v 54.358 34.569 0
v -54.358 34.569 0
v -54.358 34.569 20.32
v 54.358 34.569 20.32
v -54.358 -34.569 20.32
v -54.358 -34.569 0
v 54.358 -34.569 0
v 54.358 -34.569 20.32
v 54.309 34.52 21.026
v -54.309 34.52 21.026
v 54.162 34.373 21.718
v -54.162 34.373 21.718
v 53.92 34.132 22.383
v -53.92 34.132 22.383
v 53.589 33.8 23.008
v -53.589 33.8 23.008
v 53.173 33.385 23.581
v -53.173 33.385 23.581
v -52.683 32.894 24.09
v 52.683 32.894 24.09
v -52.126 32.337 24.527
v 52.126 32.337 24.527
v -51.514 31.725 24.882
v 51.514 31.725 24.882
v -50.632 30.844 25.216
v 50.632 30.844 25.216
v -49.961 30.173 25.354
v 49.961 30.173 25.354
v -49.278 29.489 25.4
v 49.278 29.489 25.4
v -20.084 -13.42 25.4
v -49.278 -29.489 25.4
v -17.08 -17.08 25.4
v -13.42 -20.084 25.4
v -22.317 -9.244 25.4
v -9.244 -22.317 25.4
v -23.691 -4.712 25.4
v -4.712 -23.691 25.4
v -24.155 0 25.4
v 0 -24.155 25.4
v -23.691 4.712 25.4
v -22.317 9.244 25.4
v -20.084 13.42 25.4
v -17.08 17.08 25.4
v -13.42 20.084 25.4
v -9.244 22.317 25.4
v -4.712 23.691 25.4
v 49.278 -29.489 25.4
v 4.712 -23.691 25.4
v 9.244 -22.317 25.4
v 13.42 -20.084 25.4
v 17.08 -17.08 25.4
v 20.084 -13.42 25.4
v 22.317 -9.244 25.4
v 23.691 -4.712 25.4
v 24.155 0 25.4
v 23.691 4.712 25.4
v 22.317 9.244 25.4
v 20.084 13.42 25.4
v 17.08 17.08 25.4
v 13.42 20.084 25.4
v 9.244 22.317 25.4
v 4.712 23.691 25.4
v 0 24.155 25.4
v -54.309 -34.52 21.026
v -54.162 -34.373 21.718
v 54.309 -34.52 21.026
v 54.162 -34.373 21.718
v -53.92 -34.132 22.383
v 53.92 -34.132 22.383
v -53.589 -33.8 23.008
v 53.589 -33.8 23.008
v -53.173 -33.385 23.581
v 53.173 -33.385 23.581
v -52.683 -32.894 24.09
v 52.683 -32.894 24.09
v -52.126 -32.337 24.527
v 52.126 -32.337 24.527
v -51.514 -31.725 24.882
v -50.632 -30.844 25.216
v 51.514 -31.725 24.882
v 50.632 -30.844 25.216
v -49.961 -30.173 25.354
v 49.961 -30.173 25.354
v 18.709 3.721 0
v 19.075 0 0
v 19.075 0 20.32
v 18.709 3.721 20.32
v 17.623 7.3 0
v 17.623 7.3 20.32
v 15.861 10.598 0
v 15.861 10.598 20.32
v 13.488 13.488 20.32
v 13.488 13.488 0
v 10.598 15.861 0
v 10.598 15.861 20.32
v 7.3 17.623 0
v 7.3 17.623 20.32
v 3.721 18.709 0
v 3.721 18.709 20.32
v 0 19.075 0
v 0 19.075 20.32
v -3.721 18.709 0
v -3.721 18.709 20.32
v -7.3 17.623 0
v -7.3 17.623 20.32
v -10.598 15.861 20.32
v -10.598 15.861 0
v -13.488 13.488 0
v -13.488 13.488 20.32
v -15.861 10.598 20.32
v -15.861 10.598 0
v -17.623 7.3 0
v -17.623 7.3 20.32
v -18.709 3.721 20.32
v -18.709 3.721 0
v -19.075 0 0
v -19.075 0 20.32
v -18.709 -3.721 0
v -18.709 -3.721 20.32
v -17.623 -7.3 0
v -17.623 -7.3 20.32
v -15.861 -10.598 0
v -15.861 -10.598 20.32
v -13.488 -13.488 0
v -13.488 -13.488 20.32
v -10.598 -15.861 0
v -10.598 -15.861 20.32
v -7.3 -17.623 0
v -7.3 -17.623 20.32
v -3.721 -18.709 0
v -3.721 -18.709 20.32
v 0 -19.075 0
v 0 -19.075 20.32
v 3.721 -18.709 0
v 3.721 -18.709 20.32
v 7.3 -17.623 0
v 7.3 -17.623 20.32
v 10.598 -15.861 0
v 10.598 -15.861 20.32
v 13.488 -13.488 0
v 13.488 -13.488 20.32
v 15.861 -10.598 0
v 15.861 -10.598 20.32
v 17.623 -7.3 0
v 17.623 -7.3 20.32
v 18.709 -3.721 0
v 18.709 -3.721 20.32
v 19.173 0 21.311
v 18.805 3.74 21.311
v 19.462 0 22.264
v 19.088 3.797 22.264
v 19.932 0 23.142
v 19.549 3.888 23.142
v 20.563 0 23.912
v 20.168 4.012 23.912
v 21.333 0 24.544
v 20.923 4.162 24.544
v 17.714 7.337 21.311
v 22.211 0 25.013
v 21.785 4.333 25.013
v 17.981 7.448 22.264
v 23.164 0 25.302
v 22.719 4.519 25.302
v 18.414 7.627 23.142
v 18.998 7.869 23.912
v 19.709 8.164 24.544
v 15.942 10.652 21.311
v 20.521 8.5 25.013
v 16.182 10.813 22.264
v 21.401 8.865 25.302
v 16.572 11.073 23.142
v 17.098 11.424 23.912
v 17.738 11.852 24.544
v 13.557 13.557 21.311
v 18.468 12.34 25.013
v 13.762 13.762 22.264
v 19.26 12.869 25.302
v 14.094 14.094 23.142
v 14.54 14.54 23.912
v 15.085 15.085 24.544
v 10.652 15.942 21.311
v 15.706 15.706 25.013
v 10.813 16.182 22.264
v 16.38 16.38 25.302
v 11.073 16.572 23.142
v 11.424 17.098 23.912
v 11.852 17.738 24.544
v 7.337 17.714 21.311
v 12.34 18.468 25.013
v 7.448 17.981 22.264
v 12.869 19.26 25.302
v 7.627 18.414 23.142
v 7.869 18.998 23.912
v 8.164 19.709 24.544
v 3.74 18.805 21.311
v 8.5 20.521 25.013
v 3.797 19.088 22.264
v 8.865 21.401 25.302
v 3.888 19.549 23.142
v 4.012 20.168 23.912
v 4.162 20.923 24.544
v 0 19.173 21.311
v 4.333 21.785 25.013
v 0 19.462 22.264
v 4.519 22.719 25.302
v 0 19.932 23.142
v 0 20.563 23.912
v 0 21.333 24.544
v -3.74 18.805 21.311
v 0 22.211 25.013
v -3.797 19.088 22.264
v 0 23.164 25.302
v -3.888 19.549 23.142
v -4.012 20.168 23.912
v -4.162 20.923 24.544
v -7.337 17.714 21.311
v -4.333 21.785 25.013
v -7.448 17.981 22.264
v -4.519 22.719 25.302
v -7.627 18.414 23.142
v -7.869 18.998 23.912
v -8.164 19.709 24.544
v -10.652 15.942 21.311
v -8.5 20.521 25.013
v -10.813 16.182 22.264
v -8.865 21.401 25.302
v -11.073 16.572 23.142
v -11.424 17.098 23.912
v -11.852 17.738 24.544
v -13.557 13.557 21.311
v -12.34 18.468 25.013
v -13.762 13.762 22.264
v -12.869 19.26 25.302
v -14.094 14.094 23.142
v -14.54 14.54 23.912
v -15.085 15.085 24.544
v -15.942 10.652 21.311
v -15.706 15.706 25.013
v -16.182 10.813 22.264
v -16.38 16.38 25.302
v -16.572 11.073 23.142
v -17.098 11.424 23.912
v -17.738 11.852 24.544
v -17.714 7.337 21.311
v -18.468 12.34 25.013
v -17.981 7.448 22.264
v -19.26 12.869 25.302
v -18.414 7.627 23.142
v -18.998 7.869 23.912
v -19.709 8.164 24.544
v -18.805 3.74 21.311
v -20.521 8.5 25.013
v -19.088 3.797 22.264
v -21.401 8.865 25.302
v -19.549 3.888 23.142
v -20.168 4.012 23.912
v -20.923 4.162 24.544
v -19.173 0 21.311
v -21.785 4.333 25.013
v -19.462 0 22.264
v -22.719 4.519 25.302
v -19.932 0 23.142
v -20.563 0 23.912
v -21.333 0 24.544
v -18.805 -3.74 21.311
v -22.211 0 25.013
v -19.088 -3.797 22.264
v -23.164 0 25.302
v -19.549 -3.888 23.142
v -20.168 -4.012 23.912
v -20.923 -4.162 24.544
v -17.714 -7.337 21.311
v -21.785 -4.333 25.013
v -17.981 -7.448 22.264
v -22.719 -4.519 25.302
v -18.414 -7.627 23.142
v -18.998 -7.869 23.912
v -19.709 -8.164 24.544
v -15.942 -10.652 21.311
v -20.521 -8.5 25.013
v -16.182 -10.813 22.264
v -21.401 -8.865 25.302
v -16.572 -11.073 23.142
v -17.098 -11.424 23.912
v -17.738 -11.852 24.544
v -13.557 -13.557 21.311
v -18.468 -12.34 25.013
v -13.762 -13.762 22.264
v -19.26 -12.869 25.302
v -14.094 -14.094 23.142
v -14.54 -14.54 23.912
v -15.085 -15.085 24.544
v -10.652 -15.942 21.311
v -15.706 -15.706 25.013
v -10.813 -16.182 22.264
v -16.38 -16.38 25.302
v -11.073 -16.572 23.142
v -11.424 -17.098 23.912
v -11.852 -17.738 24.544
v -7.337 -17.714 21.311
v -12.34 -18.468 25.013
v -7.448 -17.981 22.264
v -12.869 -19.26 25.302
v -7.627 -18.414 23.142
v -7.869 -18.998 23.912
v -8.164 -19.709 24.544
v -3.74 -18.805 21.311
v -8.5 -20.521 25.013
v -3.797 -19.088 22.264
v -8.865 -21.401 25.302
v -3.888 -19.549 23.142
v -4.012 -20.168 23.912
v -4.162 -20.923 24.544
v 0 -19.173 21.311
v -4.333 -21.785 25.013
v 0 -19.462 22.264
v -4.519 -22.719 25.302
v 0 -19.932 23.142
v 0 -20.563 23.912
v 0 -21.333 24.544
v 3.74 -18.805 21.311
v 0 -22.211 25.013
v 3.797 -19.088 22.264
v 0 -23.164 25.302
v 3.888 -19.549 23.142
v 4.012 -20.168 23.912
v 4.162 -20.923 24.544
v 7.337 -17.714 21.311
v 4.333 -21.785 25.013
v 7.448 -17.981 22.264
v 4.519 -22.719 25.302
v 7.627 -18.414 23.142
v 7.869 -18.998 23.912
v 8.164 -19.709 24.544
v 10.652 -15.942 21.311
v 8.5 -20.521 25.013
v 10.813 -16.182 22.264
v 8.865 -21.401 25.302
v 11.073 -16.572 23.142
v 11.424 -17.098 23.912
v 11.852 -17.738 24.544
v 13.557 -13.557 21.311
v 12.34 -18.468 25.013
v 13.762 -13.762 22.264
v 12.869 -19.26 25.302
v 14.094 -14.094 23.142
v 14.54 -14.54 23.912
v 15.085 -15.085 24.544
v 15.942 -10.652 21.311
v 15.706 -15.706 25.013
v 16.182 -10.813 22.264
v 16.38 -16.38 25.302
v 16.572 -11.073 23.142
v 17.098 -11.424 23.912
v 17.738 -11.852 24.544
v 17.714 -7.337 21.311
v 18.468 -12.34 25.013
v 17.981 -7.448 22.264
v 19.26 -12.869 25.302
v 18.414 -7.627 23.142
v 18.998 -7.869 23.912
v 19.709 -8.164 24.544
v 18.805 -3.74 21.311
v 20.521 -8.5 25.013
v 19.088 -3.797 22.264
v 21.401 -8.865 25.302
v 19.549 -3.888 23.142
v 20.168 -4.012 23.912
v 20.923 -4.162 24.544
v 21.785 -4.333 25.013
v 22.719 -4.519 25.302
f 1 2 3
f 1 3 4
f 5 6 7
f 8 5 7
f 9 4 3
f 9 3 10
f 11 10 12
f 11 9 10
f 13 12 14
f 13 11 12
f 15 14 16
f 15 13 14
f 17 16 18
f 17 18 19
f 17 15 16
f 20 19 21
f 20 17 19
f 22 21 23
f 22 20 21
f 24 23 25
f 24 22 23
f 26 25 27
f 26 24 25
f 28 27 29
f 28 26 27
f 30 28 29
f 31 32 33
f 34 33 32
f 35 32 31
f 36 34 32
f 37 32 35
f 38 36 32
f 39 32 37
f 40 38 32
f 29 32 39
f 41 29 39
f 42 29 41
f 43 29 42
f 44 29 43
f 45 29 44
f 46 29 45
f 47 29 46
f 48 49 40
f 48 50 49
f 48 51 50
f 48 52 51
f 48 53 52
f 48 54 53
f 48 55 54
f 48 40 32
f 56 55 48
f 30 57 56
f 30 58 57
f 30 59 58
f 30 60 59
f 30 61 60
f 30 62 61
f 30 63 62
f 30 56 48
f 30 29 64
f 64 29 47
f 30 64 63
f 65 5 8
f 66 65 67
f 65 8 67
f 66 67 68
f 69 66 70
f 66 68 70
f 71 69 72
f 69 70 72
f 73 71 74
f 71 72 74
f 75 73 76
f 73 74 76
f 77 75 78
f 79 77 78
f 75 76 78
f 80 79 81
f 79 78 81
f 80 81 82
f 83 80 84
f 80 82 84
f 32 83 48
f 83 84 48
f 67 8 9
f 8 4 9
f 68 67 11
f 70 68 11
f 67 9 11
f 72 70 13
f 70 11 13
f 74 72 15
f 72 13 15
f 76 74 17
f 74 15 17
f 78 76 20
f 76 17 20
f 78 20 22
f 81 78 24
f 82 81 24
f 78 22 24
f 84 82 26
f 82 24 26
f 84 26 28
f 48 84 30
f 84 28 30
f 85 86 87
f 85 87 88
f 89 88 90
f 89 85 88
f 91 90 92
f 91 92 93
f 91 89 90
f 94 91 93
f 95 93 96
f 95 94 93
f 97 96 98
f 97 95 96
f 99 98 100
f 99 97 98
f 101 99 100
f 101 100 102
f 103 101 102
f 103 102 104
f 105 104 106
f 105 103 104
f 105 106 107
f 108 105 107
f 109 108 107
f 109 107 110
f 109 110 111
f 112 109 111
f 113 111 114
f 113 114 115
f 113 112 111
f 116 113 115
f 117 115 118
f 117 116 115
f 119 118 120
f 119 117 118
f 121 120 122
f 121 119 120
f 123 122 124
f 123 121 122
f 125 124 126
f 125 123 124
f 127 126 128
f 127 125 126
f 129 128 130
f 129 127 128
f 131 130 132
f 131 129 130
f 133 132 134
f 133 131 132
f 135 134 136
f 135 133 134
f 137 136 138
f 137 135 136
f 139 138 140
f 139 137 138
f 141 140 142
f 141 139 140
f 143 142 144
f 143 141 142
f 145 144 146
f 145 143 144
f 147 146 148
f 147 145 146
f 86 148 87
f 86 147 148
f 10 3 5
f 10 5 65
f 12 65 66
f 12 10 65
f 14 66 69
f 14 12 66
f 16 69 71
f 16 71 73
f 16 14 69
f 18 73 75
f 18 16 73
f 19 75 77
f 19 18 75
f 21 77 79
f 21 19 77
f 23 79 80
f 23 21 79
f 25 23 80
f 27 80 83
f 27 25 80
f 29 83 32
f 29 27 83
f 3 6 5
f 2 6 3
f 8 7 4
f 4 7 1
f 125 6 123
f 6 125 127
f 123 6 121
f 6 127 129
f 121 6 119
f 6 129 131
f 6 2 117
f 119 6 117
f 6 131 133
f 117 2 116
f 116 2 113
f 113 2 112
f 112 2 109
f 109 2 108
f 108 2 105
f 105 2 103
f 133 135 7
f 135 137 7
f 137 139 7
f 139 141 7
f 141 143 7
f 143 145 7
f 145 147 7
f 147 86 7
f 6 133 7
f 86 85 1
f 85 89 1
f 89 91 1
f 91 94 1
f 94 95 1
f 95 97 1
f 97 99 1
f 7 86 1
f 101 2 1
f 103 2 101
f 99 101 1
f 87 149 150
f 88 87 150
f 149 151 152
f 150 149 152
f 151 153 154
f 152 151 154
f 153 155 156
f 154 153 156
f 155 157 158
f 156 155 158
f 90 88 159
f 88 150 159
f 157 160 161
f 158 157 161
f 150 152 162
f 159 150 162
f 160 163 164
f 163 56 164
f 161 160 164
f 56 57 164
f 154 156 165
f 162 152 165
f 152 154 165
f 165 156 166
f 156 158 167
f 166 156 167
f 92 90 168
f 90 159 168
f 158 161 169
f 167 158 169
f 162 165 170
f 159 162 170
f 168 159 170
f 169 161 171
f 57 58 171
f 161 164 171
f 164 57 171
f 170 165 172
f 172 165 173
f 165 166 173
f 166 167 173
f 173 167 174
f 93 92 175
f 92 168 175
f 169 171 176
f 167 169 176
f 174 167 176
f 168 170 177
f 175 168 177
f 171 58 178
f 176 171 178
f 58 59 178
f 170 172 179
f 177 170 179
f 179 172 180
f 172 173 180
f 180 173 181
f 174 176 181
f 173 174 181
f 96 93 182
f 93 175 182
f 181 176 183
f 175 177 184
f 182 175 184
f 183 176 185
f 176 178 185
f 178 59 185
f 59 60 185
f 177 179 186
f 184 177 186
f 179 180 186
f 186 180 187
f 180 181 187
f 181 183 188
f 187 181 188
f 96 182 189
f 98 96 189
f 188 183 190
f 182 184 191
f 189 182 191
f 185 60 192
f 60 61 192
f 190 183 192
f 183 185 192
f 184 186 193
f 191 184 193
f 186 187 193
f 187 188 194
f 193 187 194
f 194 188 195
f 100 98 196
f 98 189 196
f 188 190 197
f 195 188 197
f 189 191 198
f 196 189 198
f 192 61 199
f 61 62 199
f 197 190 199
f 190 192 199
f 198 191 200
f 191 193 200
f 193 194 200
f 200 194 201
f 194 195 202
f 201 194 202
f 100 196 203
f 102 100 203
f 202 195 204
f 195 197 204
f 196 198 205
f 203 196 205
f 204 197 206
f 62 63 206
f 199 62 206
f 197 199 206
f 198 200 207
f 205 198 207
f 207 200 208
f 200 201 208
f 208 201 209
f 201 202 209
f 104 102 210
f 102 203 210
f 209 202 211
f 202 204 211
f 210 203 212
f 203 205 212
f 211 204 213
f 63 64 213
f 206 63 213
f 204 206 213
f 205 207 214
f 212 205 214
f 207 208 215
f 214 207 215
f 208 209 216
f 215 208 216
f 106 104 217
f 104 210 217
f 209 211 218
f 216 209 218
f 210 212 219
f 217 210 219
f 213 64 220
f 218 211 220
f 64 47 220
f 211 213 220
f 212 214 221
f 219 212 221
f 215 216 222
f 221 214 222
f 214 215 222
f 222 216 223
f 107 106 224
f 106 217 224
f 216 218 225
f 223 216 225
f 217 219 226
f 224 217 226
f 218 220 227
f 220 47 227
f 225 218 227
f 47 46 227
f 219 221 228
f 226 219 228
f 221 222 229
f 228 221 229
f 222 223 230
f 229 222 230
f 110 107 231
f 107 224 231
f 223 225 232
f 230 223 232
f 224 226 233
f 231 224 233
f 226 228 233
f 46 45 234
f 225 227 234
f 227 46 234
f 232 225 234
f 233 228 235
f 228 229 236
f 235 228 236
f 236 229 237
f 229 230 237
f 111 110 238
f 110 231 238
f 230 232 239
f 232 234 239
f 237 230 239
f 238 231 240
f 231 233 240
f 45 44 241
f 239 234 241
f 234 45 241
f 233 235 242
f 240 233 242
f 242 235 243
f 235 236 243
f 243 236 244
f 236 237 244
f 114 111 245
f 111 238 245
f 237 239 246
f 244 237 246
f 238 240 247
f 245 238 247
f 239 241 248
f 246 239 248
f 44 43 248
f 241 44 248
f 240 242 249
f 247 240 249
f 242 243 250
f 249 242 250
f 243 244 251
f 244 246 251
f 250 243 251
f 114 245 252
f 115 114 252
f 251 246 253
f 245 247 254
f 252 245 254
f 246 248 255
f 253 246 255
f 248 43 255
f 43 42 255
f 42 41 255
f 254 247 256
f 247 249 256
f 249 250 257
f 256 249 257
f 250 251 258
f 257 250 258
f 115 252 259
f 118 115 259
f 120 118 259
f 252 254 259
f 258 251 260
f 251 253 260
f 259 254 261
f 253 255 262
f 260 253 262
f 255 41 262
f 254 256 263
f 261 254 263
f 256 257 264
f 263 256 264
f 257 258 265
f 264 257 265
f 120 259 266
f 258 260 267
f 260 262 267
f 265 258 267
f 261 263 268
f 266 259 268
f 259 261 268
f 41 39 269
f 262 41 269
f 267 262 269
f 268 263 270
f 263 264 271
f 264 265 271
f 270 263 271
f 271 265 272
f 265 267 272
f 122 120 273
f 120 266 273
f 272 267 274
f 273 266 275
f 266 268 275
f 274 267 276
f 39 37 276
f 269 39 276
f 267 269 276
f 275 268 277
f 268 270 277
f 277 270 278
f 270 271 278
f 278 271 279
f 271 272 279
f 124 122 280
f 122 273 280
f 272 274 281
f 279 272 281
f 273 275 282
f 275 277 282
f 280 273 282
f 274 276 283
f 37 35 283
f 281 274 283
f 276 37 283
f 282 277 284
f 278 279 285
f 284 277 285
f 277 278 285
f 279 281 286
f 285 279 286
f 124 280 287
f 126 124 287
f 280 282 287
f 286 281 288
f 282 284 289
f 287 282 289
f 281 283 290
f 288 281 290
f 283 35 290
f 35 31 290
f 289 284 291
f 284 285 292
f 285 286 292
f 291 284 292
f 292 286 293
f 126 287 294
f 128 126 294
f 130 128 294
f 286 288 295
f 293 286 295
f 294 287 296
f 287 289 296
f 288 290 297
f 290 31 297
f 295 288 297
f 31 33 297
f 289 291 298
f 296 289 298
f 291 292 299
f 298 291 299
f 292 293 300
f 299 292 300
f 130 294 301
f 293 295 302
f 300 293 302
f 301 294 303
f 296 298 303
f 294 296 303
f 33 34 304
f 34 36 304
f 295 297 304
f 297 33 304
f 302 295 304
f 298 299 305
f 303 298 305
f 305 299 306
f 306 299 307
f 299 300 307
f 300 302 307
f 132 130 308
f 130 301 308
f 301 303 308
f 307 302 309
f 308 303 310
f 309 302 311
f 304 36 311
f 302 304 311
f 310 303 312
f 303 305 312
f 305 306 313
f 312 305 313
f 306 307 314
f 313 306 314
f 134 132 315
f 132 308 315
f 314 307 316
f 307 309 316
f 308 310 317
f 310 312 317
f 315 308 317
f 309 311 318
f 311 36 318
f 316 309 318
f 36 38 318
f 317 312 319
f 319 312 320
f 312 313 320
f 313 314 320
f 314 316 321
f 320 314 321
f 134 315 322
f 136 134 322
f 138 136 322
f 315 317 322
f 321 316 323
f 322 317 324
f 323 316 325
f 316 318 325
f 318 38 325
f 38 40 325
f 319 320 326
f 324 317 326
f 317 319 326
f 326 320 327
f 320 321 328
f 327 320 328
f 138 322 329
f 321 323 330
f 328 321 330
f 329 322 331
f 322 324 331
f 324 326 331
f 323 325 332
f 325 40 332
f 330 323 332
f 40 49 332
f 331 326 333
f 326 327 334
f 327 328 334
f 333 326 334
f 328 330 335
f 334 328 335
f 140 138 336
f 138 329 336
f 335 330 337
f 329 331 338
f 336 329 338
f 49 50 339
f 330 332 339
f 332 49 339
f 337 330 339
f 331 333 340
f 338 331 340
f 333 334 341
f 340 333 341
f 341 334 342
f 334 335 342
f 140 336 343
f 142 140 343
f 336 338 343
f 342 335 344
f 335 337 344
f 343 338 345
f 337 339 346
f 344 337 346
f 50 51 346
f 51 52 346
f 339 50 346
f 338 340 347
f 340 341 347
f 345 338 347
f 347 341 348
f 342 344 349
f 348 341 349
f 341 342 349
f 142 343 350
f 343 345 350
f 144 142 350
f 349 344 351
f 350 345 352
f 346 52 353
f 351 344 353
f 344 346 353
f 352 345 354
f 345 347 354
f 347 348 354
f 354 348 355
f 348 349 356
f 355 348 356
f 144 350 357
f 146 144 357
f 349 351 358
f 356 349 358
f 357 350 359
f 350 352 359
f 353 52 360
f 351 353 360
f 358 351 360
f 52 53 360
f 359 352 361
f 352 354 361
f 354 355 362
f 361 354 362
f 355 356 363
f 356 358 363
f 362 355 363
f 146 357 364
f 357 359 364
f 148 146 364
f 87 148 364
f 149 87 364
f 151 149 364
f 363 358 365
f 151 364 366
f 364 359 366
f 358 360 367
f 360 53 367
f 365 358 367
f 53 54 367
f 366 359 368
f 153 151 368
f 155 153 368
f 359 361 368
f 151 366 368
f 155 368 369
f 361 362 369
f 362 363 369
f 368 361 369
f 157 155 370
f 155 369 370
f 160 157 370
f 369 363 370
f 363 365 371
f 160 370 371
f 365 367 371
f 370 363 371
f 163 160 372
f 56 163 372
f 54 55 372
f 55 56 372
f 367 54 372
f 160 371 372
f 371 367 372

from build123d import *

# Parameters (mm, degrees)
F0_W     = 108.715884
F0_H     = 69.138416
F0_R     = 19.075382
F1_DEPTH = 25.4
F2_R     = 5.08


with BuildPart() as f1:
    # F0 (on Top) → F1 (new body)
    with BuildSketch(Plane.XY):
        Rectangle(F0_W, F0_H)
        Circle(F0_R, mode=Mode.SUBTRACT)
    extrude(amount=F1_DEPTH)

    # F2
    f2_edges = [f1.edges().sort_by_distance(p)[0] for p in [
        (0, -34.569208, 25.4),
        (-54.357942, 0, 25.4),
        (0, 34.569208, 25.4),
        (54.357942, 0, 25.4),
        (-19.075382, 0, 25.4),
    ]]
    fillet(f2_edges, radius=F2_R)


solid = f1.part
